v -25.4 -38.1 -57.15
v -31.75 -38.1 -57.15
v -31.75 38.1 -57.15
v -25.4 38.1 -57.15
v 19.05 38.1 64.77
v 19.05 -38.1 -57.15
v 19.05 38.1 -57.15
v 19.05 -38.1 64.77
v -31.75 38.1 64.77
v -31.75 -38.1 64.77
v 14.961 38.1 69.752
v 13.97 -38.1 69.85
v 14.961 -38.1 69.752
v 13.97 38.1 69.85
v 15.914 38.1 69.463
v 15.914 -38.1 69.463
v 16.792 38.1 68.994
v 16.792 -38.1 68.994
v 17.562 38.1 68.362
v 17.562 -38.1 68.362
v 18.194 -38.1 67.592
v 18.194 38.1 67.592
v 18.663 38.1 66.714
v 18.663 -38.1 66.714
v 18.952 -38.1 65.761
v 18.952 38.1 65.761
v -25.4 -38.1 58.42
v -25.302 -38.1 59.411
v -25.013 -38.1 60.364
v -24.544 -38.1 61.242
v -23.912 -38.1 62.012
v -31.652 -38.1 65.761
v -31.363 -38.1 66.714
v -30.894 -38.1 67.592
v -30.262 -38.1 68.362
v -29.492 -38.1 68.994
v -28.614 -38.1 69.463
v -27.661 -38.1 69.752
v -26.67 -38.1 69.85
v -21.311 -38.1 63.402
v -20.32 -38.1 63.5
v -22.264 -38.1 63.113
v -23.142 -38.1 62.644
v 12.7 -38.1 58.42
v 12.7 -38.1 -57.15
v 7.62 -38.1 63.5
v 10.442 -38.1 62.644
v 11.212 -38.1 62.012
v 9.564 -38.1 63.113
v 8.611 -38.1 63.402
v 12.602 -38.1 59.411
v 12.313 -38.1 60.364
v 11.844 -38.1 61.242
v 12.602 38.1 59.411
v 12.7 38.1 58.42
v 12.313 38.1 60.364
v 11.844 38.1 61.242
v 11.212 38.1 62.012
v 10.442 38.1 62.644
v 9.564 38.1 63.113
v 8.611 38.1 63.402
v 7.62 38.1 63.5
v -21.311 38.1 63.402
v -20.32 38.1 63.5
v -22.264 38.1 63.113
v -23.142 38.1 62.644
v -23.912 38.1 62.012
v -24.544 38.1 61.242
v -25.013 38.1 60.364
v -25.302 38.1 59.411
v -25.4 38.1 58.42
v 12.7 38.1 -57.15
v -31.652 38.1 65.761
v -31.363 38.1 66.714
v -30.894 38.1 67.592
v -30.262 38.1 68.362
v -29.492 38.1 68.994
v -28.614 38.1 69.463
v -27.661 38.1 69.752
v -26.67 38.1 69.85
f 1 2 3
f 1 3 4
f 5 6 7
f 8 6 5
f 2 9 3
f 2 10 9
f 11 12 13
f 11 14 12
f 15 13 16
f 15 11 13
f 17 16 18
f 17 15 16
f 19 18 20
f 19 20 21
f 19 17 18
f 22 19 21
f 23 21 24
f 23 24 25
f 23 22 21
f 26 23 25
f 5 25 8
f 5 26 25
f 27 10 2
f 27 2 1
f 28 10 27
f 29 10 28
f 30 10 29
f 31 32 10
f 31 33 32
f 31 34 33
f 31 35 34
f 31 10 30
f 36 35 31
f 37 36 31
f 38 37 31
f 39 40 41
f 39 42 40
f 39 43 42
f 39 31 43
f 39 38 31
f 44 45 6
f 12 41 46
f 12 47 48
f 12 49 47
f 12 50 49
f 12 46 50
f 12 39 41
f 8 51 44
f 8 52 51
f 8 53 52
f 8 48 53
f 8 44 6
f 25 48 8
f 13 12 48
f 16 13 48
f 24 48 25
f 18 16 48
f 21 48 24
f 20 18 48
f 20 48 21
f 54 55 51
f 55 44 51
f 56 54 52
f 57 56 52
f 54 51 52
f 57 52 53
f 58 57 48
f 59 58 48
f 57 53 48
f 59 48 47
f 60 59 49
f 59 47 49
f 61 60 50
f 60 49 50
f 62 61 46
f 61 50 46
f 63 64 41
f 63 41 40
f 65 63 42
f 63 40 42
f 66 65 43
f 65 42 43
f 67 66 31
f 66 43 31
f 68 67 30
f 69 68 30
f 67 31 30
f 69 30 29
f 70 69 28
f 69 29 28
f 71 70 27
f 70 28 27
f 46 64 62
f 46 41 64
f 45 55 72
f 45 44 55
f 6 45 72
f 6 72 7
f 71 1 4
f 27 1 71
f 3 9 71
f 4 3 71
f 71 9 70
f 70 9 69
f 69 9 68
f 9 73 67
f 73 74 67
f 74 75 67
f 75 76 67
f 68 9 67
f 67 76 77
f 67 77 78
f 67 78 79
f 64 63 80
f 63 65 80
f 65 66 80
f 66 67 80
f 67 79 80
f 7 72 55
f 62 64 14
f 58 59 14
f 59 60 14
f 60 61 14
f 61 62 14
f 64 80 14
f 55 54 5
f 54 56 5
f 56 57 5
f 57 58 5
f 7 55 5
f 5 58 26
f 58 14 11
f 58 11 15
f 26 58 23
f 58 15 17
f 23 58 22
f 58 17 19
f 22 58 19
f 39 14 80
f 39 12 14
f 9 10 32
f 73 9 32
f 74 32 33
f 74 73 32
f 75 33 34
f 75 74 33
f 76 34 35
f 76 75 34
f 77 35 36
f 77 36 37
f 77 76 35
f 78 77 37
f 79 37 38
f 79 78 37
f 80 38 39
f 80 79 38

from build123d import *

# Parameters (mm, degrees)
F1_DEPTH      = 38.1
F1_DEPTH_BACK = 38.1
F2_R          = 5.08


with BuildPart() as f1:
    # F0 (on Front) → F1 (new body, two sides)
    with BuildSketch(Plane.XZ) as f1_sk:
        Polygon((-31.75, 69.85), (-31.75, -57.15), (-25.4, -57.15), (-25.4, 63.5), (12.7, 63.5), (12.7, -57.15), (19.05, -57.15), (19.05, 69.85), align=None)
    extrude(amount=F1_DEPTH)
    extrude(f1_sk.sketch, amount=-F1_DEPTH_BACK)

    # F2
    f2_edges = [f1.edges().sort_by_distance(p)[0] for p in [
        (-31.75, 0, 69.85),
        (19.05, 0, 69.85),
        (-25.4, 0, 63.5),
        (12.7, 0, 63.5),
    ]]
    fillet(f2_edges, radius=F2_R)


solid = f1.part
